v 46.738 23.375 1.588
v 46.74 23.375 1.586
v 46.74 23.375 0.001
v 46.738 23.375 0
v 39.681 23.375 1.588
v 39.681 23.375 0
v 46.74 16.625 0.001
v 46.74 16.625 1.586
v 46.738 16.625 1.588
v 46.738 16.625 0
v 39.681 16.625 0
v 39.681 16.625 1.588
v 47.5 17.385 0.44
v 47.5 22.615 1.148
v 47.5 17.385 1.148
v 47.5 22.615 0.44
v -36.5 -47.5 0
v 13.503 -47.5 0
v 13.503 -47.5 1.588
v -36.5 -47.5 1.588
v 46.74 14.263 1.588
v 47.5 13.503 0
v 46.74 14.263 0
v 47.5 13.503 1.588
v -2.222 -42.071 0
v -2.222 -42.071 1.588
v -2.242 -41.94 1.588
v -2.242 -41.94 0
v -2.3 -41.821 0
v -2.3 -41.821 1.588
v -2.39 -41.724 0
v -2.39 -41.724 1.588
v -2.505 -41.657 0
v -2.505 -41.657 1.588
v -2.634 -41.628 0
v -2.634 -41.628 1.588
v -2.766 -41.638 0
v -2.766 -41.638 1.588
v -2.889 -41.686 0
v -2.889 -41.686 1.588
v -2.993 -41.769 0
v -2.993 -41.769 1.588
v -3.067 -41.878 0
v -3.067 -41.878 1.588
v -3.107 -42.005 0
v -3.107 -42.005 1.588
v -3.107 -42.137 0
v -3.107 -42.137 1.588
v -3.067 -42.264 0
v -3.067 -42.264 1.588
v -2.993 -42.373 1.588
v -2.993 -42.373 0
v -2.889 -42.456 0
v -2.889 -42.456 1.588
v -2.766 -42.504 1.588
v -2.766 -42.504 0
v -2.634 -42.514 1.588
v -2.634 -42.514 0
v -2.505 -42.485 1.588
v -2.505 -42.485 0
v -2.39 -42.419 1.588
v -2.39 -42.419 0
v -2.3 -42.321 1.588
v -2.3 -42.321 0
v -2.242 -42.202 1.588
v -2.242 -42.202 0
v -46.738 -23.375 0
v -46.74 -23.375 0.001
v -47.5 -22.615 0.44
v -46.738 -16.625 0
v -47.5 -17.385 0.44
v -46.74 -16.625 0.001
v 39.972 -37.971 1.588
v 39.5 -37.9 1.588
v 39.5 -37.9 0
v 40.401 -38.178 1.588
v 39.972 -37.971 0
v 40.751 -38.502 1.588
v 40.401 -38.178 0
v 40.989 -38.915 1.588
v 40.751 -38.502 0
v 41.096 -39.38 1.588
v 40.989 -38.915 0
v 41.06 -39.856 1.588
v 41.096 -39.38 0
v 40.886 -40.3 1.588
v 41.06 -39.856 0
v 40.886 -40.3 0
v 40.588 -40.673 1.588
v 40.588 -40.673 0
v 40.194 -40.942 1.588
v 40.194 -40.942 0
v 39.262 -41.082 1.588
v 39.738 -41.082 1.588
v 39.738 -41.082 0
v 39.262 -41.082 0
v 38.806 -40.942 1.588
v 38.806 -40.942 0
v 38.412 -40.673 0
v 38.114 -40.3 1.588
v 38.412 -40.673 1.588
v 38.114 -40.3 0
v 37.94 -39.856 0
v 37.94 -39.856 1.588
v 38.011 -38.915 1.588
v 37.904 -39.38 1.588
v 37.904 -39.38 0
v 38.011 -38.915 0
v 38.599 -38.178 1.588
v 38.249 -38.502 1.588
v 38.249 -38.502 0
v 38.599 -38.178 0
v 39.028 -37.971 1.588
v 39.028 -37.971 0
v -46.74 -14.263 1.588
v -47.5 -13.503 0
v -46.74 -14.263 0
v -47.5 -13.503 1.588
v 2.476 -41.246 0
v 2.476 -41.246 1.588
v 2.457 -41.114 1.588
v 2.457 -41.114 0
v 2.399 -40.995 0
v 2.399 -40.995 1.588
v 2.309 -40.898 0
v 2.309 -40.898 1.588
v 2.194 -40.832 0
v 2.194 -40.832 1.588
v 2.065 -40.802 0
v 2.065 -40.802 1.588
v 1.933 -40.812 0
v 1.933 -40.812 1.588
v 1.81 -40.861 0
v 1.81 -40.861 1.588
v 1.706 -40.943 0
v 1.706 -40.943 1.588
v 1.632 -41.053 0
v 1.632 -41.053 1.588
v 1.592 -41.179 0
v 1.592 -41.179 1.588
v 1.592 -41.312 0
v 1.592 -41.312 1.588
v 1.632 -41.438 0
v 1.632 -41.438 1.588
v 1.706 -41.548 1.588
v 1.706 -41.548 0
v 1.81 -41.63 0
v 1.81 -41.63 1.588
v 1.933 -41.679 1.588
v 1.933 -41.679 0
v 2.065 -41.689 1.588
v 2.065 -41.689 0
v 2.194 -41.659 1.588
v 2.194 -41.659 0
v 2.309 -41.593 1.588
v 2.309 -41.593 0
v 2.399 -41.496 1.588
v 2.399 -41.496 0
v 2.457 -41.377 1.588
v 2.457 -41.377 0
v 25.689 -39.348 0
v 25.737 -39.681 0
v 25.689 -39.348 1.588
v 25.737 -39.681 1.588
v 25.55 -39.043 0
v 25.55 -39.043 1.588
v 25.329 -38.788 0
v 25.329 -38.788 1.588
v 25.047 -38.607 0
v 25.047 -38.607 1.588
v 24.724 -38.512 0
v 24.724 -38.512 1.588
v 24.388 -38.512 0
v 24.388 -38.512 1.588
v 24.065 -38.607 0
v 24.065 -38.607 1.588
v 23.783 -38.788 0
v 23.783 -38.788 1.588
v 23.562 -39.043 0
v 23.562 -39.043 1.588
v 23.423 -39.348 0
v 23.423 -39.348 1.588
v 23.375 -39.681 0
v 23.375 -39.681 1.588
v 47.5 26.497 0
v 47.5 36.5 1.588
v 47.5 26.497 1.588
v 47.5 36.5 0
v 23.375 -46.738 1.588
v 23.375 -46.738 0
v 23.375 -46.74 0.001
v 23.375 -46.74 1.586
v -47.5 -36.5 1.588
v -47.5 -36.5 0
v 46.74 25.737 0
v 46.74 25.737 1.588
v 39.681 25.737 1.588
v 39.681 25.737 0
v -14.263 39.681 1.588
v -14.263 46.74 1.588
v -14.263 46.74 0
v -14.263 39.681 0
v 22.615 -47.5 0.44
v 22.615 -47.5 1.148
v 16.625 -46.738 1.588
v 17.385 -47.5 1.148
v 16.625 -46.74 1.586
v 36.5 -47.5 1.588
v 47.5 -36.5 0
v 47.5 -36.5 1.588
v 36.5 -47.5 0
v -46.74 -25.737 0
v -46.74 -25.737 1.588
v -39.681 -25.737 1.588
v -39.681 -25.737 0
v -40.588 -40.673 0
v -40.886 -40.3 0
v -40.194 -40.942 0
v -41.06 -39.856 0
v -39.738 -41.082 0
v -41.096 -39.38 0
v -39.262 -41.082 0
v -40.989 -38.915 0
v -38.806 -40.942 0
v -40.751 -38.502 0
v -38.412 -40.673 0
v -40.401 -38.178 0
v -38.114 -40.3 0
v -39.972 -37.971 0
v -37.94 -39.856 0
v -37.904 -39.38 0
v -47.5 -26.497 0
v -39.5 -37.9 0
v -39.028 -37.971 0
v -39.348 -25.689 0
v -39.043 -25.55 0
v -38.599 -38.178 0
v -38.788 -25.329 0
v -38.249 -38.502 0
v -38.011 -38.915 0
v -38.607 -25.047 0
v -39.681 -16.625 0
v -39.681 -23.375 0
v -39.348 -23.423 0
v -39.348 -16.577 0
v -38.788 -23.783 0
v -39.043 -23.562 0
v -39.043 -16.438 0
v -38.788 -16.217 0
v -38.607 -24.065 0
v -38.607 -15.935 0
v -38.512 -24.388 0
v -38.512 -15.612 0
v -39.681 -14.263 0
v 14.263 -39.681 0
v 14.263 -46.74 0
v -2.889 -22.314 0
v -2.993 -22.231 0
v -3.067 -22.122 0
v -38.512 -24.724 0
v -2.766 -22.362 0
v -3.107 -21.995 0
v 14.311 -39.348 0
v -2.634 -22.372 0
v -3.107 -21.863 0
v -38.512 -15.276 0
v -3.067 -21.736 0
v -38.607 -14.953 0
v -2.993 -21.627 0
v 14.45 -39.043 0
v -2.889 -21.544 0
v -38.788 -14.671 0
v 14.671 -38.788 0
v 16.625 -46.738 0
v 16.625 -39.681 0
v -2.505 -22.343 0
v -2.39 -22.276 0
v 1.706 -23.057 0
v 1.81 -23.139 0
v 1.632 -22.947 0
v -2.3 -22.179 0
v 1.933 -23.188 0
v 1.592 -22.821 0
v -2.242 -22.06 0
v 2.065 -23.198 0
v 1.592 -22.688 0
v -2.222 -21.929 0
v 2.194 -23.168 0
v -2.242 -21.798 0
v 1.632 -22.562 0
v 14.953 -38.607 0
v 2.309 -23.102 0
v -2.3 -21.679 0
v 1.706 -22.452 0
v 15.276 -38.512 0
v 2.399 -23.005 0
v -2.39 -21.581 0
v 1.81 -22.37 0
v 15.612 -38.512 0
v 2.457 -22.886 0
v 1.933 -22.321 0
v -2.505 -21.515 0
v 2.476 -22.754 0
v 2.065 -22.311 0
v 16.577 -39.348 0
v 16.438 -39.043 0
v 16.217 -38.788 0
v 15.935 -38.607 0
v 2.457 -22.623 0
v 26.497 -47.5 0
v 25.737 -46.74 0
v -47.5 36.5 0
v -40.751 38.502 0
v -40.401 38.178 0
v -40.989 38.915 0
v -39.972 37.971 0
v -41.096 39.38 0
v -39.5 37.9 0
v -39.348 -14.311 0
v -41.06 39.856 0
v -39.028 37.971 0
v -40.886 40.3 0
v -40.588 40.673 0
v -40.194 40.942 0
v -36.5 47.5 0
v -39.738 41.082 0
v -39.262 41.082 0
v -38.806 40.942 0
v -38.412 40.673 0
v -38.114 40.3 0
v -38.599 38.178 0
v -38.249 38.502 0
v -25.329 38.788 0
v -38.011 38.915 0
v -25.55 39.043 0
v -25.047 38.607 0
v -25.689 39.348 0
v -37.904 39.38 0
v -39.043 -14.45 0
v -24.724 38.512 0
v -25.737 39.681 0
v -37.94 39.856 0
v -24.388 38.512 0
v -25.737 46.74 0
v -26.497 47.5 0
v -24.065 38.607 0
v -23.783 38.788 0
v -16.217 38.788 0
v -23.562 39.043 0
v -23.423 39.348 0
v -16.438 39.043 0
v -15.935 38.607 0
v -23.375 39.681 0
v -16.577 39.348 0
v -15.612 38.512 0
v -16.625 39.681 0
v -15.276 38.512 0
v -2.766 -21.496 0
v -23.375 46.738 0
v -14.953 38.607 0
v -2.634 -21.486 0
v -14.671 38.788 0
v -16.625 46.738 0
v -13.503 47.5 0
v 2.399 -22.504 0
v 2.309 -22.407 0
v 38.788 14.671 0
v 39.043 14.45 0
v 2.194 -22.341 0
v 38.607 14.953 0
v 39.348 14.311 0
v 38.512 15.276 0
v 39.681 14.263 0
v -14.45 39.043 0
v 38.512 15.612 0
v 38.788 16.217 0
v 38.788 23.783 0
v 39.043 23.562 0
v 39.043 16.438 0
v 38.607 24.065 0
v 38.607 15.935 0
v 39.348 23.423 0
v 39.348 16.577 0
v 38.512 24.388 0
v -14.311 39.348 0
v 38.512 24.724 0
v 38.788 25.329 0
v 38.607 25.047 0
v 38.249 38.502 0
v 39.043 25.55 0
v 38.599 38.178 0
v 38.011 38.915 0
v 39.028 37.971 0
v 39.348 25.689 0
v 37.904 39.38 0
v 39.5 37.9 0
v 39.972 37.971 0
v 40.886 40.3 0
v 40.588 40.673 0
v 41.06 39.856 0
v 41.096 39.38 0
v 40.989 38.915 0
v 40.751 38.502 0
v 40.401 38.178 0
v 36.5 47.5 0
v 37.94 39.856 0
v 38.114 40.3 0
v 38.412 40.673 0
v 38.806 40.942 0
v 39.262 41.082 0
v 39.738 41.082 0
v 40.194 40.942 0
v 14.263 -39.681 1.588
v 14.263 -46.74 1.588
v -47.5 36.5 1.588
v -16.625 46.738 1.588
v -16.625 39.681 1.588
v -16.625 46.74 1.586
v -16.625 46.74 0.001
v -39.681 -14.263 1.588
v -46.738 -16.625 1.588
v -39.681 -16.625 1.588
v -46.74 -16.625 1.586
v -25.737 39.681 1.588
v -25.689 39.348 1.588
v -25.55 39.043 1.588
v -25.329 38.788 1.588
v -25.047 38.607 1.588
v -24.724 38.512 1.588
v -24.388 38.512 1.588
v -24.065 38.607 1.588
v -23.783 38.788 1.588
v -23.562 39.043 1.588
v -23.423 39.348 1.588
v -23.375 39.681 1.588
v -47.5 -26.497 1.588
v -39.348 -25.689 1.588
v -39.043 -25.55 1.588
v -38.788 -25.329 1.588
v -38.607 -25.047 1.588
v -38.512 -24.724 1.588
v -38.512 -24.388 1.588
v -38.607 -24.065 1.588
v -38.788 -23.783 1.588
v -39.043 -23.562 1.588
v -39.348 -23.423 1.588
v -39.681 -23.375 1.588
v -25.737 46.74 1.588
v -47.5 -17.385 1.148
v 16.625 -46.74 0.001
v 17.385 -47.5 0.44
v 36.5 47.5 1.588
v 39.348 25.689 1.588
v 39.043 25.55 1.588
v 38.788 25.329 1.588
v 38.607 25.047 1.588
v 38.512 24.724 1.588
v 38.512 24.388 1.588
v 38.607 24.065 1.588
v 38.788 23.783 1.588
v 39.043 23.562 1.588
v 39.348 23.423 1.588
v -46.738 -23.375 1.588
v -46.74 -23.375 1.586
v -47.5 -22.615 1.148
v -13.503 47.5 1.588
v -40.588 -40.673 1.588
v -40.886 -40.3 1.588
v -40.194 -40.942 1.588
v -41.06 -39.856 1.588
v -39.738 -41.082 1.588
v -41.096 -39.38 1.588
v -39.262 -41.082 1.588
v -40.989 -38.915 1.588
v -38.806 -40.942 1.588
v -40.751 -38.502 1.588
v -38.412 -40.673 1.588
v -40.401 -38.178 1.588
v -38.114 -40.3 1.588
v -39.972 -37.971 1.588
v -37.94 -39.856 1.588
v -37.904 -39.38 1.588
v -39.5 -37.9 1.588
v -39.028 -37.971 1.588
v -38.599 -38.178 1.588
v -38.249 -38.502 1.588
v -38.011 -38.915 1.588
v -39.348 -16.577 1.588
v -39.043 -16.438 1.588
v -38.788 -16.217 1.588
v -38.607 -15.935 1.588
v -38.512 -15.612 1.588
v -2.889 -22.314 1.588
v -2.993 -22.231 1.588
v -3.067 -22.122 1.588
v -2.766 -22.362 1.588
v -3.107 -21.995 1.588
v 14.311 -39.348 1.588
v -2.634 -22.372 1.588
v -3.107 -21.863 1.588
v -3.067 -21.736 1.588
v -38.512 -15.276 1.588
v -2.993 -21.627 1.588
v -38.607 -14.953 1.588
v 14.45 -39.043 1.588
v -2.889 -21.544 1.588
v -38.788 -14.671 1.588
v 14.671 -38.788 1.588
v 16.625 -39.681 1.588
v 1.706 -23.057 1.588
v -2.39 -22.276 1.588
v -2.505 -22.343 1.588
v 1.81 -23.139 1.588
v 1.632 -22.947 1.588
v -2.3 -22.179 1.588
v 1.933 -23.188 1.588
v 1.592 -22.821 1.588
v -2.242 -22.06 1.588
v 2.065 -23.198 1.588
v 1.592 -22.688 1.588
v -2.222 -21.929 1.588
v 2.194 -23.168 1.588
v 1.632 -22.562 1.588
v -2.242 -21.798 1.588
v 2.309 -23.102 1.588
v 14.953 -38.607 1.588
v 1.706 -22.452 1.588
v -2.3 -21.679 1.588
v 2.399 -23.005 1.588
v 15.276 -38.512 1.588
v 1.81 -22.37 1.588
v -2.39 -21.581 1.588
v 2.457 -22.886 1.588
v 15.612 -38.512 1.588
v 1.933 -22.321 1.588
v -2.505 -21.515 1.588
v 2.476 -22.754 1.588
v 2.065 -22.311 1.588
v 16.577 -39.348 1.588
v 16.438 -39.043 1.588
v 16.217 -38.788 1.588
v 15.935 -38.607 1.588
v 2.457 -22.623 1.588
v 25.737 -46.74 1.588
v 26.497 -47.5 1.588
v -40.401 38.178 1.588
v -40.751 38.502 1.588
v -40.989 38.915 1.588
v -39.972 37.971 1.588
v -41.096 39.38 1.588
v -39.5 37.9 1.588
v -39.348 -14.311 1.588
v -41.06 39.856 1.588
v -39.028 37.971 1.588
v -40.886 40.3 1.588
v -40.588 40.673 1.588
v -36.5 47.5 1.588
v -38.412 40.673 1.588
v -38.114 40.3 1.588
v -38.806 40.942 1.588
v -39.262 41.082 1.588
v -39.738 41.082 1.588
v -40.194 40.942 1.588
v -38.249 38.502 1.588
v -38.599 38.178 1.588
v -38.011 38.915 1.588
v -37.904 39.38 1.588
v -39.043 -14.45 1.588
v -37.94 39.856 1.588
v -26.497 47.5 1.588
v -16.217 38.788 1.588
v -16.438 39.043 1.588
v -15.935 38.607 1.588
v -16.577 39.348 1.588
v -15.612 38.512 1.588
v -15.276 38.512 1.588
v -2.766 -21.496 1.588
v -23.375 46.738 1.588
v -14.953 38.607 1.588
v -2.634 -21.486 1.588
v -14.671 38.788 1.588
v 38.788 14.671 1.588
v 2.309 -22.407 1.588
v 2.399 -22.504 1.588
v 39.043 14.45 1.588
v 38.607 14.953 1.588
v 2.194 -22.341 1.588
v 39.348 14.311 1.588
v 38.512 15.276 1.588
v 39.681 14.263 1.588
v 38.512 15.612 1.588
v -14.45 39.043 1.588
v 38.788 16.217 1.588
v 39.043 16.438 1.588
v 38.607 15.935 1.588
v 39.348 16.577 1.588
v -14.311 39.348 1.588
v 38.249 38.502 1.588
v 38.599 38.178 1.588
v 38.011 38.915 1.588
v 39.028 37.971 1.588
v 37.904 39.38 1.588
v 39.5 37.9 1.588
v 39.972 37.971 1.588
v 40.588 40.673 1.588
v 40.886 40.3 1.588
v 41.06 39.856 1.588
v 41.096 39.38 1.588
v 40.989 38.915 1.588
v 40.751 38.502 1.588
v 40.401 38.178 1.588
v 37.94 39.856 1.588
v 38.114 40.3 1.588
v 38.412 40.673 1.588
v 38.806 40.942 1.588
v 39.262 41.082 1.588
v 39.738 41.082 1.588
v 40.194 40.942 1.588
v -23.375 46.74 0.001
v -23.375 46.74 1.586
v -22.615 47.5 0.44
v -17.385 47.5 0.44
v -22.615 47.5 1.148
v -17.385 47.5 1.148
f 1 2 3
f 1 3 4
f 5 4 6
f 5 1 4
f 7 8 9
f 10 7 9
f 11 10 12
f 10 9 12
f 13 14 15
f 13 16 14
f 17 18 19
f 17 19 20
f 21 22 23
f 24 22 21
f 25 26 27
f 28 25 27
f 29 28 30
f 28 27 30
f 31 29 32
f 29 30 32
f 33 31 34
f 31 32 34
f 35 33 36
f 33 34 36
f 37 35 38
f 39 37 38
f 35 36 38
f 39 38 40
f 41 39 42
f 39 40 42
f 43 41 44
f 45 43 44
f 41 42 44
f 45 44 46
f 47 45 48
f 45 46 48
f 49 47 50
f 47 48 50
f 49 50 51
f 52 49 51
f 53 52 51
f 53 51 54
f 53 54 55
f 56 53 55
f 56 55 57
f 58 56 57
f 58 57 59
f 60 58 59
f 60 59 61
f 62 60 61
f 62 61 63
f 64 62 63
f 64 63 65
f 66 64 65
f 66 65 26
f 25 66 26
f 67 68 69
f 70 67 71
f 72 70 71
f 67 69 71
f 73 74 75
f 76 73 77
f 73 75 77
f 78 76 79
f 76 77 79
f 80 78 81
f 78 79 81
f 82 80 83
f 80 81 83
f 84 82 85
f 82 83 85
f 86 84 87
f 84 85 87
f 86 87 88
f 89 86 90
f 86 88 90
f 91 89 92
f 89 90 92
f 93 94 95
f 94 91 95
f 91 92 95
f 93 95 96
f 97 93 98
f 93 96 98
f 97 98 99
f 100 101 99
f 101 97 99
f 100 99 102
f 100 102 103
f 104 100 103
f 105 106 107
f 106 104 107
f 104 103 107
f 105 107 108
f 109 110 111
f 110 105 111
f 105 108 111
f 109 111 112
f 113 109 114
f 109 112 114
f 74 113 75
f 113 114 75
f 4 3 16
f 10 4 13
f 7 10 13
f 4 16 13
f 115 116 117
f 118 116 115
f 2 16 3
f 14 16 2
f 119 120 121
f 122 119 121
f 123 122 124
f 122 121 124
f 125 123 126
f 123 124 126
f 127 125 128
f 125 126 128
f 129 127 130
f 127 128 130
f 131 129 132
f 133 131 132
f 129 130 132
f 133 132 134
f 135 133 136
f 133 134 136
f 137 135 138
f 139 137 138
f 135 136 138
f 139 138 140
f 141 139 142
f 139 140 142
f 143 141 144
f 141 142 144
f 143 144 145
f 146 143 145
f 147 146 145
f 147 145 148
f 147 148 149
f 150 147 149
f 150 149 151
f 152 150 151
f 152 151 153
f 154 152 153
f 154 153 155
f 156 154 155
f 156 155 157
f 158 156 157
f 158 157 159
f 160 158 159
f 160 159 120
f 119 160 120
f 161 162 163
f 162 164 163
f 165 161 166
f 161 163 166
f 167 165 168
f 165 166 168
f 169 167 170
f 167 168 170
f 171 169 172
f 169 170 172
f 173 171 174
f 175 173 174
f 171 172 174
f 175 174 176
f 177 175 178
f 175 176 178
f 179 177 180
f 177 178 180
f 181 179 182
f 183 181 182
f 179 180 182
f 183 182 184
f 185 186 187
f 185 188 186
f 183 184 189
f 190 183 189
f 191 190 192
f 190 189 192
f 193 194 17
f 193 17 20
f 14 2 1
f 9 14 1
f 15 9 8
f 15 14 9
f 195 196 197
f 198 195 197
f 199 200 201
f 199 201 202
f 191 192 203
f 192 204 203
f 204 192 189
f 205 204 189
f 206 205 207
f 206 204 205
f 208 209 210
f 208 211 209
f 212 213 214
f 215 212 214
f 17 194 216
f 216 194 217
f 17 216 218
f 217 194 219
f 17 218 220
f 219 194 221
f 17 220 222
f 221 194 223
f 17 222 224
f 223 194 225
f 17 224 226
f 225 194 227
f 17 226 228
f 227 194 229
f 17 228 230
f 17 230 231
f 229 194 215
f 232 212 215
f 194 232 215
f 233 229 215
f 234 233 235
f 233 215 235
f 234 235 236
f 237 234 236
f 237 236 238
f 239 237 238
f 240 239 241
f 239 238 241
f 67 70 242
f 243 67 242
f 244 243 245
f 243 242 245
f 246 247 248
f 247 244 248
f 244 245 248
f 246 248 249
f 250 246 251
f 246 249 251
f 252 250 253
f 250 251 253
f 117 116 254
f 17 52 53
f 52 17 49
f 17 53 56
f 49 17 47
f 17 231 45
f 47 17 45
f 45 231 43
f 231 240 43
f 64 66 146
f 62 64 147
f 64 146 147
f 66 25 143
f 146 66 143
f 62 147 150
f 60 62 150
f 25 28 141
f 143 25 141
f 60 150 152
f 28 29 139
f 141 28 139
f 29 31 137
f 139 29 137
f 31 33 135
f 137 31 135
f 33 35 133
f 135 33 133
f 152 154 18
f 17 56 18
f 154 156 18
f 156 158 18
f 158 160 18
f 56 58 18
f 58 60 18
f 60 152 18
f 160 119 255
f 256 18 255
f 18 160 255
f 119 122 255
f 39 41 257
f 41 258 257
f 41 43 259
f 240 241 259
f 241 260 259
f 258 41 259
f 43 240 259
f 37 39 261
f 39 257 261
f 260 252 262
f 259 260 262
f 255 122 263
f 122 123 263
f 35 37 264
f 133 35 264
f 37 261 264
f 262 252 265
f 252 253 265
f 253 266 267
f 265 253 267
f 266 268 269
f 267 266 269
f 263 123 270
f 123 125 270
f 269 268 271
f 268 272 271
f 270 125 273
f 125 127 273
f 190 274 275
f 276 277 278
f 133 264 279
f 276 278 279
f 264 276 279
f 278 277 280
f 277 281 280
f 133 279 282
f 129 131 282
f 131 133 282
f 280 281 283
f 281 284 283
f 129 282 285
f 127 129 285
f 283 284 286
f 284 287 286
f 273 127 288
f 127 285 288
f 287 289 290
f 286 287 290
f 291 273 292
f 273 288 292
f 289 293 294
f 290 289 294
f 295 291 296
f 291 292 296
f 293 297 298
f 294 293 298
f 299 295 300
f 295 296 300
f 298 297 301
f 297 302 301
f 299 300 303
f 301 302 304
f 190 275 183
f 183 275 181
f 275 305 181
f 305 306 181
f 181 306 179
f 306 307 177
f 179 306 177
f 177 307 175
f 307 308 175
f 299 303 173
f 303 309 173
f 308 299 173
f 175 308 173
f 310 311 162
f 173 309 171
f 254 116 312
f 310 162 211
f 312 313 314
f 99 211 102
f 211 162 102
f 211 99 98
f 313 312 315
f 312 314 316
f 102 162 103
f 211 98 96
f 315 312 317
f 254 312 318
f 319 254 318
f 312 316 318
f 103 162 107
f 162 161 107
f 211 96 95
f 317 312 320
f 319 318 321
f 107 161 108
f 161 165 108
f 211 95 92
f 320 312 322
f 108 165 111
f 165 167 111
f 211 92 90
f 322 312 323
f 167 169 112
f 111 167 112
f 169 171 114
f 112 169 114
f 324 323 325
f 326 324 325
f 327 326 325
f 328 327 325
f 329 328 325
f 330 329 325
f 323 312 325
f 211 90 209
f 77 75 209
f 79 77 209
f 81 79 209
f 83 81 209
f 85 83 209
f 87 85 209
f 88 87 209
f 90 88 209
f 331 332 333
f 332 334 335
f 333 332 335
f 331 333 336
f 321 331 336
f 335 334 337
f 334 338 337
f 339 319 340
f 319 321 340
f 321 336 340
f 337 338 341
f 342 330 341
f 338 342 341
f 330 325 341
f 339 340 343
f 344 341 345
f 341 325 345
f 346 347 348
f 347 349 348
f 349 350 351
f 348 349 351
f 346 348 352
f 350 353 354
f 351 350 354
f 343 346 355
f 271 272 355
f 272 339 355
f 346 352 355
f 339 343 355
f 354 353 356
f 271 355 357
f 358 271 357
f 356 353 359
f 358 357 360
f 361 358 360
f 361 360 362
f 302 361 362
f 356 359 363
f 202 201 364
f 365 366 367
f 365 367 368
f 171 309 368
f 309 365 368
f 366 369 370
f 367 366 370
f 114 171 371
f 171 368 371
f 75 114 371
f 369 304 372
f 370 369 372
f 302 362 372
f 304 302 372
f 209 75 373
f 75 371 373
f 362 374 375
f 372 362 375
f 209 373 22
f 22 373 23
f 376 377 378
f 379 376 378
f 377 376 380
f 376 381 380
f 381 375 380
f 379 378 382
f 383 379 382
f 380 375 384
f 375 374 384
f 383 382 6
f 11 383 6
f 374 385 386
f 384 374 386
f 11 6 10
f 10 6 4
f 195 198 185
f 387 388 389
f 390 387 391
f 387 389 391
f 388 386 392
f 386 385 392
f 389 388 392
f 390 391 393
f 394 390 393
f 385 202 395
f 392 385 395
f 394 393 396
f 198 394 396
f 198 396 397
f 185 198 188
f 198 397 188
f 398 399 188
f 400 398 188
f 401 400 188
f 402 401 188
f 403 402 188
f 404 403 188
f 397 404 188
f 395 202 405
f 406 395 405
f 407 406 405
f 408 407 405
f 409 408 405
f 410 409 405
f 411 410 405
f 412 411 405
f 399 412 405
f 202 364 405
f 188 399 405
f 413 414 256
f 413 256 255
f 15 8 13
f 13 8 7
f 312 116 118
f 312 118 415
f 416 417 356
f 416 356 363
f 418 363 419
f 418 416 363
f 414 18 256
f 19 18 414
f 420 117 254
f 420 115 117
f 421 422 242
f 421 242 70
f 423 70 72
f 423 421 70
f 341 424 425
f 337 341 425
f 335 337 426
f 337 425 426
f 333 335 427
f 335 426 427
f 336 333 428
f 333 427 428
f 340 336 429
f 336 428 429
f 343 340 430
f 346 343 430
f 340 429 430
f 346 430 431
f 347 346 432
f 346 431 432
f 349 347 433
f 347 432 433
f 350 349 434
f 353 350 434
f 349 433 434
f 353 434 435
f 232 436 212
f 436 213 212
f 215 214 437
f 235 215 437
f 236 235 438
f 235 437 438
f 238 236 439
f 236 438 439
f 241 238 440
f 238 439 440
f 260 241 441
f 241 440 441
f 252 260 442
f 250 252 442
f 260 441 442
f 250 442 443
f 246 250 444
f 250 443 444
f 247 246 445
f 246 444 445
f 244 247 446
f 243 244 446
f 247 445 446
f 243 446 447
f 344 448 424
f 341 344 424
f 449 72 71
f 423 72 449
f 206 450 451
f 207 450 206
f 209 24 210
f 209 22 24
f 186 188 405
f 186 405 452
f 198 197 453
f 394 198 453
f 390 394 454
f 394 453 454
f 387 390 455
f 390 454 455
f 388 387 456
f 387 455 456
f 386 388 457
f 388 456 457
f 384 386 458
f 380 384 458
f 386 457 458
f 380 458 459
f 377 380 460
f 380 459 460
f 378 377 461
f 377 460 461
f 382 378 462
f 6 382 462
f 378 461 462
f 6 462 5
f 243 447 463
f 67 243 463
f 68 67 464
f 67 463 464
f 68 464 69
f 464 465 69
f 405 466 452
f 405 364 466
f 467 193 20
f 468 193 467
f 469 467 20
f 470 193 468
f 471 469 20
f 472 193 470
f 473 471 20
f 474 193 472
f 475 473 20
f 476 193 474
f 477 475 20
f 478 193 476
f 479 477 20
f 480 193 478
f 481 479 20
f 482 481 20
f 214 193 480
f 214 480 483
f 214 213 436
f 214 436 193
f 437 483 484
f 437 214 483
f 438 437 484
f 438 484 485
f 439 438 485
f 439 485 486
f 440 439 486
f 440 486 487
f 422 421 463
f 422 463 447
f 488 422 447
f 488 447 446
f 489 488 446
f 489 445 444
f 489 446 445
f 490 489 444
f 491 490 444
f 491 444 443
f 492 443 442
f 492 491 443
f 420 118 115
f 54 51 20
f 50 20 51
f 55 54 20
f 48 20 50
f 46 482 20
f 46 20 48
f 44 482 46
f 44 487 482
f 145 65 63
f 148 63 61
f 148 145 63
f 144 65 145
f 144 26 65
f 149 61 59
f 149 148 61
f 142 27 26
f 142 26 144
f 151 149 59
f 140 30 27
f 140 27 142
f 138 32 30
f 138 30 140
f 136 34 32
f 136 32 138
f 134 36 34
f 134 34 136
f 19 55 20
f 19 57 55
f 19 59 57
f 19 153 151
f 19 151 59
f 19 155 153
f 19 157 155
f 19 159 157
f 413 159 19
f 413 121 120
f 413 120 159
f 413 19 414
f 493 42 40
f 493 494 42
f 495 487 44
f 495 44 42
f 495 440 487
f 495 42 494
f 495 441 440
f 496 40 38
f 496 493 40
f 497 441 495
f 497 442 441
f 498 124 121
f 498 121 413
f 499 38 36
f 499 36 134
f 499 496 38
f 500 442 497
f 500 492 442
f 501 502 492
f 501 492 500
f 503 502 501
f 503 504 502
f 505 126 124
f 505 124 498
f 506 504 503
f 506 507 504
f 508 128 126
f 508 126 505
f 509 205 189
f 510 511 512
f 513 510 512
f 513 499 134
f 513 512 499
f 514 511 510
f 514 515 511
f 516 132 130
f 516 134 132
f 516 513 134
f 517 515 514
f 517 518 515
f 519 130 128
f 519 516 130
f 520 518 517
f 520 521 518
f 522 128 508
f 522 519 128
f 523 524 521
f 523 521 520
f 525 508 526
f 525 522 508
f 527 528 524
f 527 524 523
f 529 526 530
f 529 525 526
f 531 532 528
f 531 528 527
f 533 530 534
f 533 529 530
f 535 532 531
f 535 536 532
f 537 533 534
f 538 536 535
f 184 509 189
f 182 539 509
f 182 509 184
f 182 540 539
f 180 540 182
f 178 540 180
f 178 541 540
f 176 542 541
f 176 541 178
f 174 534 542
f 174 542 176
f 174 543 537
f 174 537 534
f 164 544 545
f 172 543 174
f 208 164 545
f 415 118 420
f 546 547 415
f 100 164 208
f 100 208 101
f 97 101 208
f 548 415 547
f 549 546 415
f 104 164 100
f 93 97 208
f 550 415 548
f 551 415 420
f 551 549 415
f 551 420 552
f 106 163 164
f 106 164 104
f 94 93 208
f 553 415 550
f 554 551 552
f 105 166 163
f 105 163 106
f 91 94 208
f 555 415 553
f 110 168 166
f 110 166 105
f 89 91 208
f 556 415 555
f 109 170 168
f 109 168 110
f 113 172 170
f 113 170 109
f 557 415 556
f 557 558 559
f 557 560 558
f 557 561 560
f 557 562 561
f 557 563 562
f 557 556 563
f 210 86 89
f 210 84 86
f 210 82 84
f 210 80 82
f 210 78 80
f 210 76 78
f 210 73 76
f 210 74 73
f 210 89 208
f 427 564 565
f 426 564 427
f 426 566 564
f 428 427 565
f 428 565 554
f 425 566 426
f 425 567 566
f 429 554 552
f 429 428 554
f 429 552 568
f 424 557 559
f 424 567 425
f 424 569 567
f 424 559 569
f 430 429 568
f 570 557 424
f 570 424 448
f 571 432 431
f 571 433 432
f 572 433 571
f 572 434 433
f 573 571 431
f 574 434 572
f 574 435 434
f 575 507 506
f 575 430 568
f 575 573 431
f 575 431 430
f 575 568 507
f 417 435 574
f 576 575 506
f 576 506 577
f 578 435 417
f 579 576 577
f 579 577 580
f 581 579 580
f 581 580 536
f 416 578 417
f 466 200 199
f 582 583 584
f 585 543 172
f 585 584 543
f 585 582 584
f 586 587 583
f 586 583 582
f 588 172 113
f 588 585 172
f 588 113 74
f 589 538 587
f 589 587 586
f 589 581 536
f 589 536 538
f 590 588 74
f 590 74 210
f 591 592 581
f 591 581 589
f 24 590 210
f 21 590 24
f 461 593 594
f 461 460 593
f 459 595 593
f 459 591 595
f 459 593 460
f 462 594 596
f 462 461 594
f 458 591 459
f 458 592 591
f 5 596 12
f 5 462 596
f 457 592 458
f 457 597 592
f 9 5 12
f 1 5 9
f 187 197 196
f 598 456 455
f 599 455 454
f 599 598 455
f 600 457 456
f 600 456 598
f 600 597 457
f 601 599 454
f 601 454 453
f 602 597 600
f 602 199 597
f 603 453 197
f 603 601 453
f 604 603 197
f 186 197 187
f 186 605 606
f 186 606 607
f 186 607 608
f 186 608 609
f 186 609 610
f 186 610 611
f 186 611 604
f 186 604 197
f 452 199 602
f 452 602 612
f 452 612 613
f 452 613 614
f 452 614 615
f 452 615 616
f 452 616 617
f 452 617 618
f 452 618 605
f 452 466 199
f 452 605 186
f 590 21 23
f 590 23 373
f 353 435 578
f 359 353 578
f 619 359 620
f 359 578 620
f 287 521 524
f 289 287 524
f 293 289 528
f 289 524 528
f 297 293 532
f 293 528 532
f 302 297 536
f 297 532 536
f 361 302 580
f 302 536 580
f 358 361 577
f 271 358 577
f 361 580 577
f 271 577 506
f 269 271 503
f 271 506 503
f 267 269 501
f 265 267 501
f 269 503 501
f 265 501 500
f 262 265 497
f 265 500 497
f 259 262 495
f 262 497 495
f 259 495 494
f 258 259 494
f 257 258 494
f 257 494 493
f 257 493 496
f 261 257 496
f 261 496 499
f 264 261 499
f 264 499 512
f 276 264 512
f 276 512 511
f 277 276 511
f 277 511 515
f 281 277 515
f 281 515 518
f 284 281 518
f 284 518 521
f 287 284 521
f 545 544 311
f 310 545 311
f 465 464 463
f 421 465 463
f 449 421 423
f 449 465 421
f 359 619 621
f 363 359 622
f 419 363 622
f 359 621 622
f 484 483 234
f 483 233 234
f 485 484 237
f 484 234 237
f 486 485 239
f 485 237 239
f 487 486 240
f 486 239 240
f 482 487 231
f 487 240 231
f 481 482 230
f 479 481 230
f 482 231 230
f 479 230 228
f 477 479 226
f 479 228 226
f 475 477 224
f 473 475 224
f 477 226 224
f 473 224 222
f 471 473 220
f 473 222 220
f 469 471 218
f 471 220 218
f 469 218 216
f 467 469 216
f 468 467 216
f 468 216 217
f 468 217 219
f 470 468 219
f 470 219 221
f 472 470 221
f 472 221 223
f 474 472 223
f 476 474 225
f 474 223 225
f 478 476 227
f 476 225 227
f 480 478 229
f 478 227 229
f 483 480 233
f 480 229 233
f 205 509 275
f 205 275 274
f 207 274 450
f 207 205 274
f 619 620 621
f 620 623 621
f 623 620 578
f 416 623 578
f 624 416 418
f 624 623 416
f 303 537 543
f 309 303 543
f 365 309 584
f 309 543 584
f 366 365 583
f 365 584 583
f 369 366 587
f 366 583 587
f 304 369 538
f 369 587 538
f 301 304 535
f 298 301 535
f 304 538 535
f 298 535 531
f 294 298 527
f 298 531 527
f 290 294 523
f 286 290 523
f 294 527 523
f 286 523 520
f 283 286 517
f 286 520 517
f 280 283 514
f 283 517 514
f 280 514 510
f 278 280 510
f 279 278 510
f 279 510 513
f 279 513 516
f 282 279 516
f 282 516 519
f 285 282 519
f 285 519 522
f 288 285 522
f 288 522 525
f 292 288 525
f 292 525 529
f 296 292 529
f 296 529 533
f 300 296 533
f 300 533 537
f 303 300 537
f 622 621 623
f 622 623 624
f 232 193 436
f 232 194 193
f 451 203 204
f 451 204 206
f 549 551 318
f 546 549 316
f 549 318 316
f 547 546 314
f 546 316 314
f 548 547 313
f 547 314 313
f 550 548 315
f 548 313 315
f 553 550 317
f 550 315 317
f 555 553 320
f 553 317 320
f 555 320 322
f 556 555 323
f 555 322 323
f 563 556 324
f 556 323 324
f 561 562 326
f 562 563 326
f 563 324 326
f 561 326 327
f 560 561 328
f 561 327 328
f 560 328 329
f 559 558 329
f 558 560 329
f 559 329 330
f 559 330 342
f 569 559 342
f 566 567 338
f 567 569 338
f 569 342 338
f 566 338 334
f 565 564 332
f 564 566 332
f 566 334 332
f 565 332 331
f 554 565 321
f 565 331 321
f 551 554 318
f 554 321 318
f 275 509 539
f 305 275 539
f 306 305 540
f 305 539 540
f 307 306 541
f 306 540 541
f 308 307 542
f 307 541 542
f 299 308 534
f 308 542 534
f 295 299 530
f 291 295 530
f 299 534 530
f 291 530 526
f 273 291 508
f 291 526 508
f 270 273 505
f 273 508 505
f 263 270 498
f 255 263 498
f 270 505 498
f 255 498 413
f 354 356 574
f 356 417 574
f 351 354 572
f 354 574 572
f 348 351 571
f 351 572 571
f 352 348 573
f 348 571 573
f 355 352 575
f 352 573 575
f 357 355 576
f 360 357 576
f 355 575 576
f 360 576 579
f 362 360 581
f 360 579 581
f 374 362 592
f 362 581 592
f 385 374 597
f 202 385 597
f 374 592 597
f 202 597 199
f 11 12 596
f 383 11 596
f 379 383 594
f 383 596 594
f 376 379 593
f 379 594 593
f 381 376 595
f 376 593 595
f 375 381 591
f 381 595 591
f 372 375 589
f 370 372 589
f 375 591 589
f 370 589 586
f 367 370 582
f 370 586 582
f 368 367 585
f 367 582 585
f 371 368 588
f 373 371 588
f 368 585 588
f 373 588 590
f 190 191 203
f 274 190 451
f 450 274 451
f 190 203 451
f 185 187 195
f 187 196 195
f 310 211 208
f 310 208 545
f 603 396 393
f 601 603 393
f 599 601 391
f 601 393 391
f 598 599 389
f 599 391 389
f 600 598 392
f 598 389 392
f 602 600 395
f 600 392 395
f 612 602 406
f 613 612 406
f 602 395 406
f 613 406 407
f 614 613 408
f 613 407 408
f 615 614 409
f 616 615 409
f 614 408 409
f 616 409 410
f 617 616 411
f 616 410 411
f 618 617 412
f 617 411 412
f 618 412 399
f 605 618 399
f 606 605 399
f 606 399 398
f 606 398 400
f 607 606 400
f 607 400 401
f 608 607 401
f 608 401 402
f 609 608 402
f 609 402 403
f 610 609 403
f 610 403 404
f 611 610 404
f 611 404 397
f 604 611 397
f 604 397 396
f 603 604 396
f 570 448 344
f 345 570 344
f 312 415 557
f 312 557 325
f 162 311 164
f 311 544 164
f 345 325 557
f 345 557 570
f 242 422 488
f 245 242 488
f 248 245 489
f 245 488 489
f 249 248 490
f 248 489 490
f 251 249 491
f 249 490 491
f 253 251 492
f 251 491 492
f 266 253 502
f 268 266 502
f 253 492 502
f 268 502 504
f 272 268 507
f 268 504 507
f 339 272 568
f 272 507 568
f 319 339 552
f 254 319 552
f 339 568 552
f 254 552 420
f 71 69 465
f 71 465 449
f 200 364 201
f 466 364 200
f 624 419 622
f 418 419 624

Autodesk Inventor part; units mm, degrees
sketch "AL_spacer_contact_Zminus" plane through (0, 0, 0) normal (0, 0, 1) x (1, 0, 0)
  circle A0 centre (39.5, 39.5) radius 3.175
  circle A1 centre (39.5, -39.5) radius 3.175
  circle A2 centre (-39.5, -39.5) radius 3.175
  circle A3 centre (-39.5, 39.5) radius 3.175
  point P0 (0, 0)
  dimension "d228" = 39.5
  dimension "d229" = 39.5
  dimension "d230" = 39.5
  dimension "d231" = 39.5
  dimension "d232" = 39.5
  dimension "d233" = 39.5
  dimension "d234" = 39.5
  dimension "d235" = 39.5
  dimension "d236" = 6.35
sketch "Delrin_stayout_Zminus" plane through (0, 0, 0) normal (0, 0, 1) x (1, 0, 0)
  line L0 (47.5, 39.5) -> (47.5, 31)
  line L1 (47.5, 31) -> (39.5, 31)
  line L2 (39.5, 31) -> (31, 39.5)
  line L3 (31, 39.5) -> (31, 47.5)
  line L4 (31, 47.5) -> (39.5, 47.5)
  line L5 (39.5, 47.5) -> (47.5, 39.5)
  line L6 (-39.5, 47.5) -> (-47.5, 39.5)
  line L7 (-47.5, 39.5) -> (-47.5, 31)
  line L8 (-47.5, 31) -> (-39.5, 31)
  line L9 (-39.5, 31) -> (-31, 39.5)
  line L10 (-31, 39.5) -> (-31, 47.5)
  line L11 (-31, 47.5) -> (-39.5, 47.5)
  line L12 (47.5, -39.5) -> (39.5, -47.5)
  line L13 (39.5, -47.5) -> (31, -47.5)
  line L14 (31, -47.5) -> (31, -39.5)
  line L15 (31, -39.5) -> (39.5, -31)
  line L16 (39.5, -31) -> (47.5, -31)
  line L17 (47.5, -31) -> (47.5, -39.5)
  line L18 (-39.5, -47.5) -> (-47.5, -39.5)
  line L19 (-47.5, -39.5) -> (-47.5, -31)
  line L20 (-47.5, -31) -> (-39.5, -31)
  line L21 (-39.5, -31) -> (-31, -39.5)
  line L22 (-31, -39.5) -> (-31, -47.5)
  line L23 (-31, -47.5) -> (-39.5, -47.5)
  point P0 (0, 0)
  dimension "d243" = 16.5
  dimension "d244" = 8
  dimension "d245" = 8.5
  dimension "d246" = 16.5
  dimension "d247" = 47.5
  dimension "d248" = 47.5
  dimension "d249" = 47.5
  dimension "d250" = 47.5
  dimension "d251" = 47.5
  dimension "d252" = 47.5
  dimension "d253" = 47.5
  dimension "d254" = 47.5
sketch "Nub_stayout_Zminus" plane through (0, 0, 0) normal (0, 0, 1) x (1, 0, 0)
  line L0 (29, 47.5) -> (39.5, 47.5)
  line L1 (39.5, 47.5) -> (47.5, 39.5)
  line L2 (47.5, 39.5) -> (47.5, 29)
  line L3 (47.5, 29) -> (42, 29)
  line L4 (42, 29) -> (42, 40.4125)
  line L5 (40.4125, 42) -> (29, 42)
  line L6 (29, 42) -> (29, 47.5)
  arc A0 (42, 40.4125) -> (40.4125, 42) centre (40.4125, 40.4125) ccw
  line L7 (-29, 47.5) -> (-39.5, 47.5)
  line L8 (-39.5, 47.5) -> (-47.5, 39.5)
  line L9 (-47.5, 39.5) -> (-47.5, 29)
  line L10 (-47.5, 29) -> (-42, 29)
  line L11 (-42, 29) -> (-42, 40.4125)
  line L12 (-40.4125, 42) -> (-29, 42)
  line L13 (-29, 42) -> (-29, 47.5)
  arc A1 (-40.4125, 42) -> (-42, 40.4125) centre (-40.4125, 40.4125) ccw
  line L14 (-47.5, -29) -> (-42, -29)
  line L15 (-42, -29) -> (-42, -40.4125)
  line L16 (-40.4125, -42) -> (-29, -42)
  line L17 (-29, -42) -> (-29, -47.5)
  line L18 (-29, -47.5) -> (-39.5, -47.5)
  line L19 (-39.5, -47.5) -> (-47.5, -39.5)
  line L20 (-47.5, -39.5) -> (-47.5, -29)
  arc A2 (-42, -40.4125) -> (-40.4125, -42) centre (-40.4125, -40.4125) ccw
  line L21 (47.5, -29) -> (42, -29)
  line L22 (42, -29) -> (42, -40.4125)
  line L23 (40.4125, -42) -> (29, -42)
  line L24 (29, -42) -> (29, -47.5)
  line L25 (29, -47.5) -> (39.5, -47.5)
  line L26 (39.5, -47.5) -> (47.5, -39.5)
  line L27 (47.5, -39.5) -> (47.5, -29)
  arc A3 (40.4125, -42) -> (42, -40.4125) centre (40.4125, -40.4125) ccw
  point P0 (0, 0)
  dimension "d255" = 1.5875
  dimension "d256" = 18.5
  dimension "d257" = 8
  dimension "d258" = 5.5
  dimension "d259" = 47.5
  dimension "d260" = 47.5
  dimension "d264" = 1.5875
  dimension "d265" = 47.5
  dimension "d266" = 47.5
  dimension "d267" = 1.5875
  dimension "d268" = 47.5
  dimension "d269" = 47.5
  dimension "d270" = 1.5875
  dimension "d271" = 47.5
  dimension "d272" = 47.5
ref_plane "Zplus_face" through (0, 0, 1.5875) normal (0, 0, 1) x (1, 0, 0)
sketch "AL_spacer_contact_Zplus" plane through (0, 0, 1.5875) normal (0, 0, 1) x (1, 0, 0)
  circle A0 centre (-39.5, 39.5) radius 3.175
  circle A1 centre (-39.5, -39.5) radius 3.175
  circle A2 centre (39.5, -39.5) radius 3.175
  circle A3 centre (39.5, 39.5) radius 3.175
  point P0 (0, 0)
  dimension "d129" = 39.5
  dimension "d130" = 39.5
  dimension "d131" = 39.5
  dimension "d132" = 39.5
  dimension "d133" = 6.35
sketch "Delrin_stayout_Zplus" plane through (0, 0, 1.5875) normal (0, 0, 1) x (1, 0, 0)
  line L0 (47.5, -31) -> (47.5, -39.5)
  line L1 (47.5, -39.5) -> (39.5, -47.5)
  line L2 (39.5, -47.5) -> (31, -47.5)
  line L3 (31, -47.5) -> (31, -39.5)
  line L4 (31, -39.5) -> (39.5, -31)
  line L5 (39.5, -31) -> (47.5, -31)
  line L6 (47.5, 31) -> (47.5, 39.5)
  line L7 (47.5, 39.5) -> (39.5, 47.5)
  line L8 (39.5, 47.5) -> (31, 47.5)
  line L9 (31, 47.5) -> (31, 39.5)
  line L10 (31, 39.5) -> (39.5, 31)
  line L11 (39.5, 31) -> (47.5, 31)
  line L12 (-39.5, 47.5) -> (-47.5, 39.5)
  line L13 (-47.5, 39.5) -> (-47.5, 31)
  line L14 (-47.5, 31) -> (-39.5, 31)
  line L15 (-39.5, 31) -> (-31, 39.5)
  line L16 (-31, 39.5) -> (-31, 47.5)
  line L17 (-31, 47.5) -> (-39.5, 47.5)
  line L18 (-47.5, -39.5) -> (-39.5, -47.5)
  line L19 (-39.5, -47.5) -> (-31, -47.5)
  line L20 (-31, -47.5) -> (-31, -39.5)
  line L21 (-31, -39.5) -> (-39.5, -31)
  line L22 (-39.5, -31) -> (-47.5, -31)
  line L23 (-47.5, -31) -> (-47.5, -39.5)
  point P0 (0, 0)
  dimension "d115" = 16.5
  dimension "d116" = 16.5
  dimension "d117" = 8
  dimension "d118" = 8.5
  dimension "d121" = 47.5
  dimension "d122" = 47.5
  dimension "d123" = 47.5
  dimension "d124" = 47.5
  dimension "d125" = 47.5
  dimension "d126" = 47.5
  dimension "d127" = 47.5
  dimension "d128" = 47.5
sketch "Nub_stayout_Zplus" plane through (0, 0, 1.5875) normal (0, 0, 1) x (1, 0, 0)
  line L0 (47.5, 29) -> (42, 29)
  line L1 (42, 29) -> (42, 40.4125)
  line L2 (40.4125, 42) -> (29, 42)
  line L3 (29, 42) -> (29, 47.5)
  arc A0 (42, 40.4125) -> (40.4125, 42) centre (40.4125, 40.4125) ccw
  line L4 (29, 47.5) -> (39.5, 47.5)
  line L5 (39.5, 47.5) -> (47.5, 39.5)
  line L6 (47.5, 39.5) -> (47.5, 29)
  line L7 (-39.5, 47.5) -> (-29, 47.5)
  line L8 (-29, 47.5) -> (-29, 42)
  line L9 (-29, 42) -> (-40.4125, 42)
  line L10 (-42, 40.4125) -> (-42, 29)
  line L11 (-42, 29) -> (-47.5, 29)
  line L12 (-47.5, 29) -> (-47.5, 39.5)
  line L13 (-47.5, 39.5) -> (-39.5, 47.5)
  arc A1 (-40.4125, 42) -> (-42, 40.4125) centre (-40.4125, 40.4125) ccw
  line L14 (-47.5, -29) -> (-47.5, -39.5)
  line L15 (-47.5, -39.5) -> (-39.5, -47.5)
  line L16 (-39.5, -47.5) -> (-29, -47.5)
  line L17 (-29, -47.5) -> (-29, -42)
  line L18 (-29, -42) -> (-40.4125, -42)
  line L19 (-42, -40.4125) -> (-42, -29)
  line L20 (-42, -29) -> (-47.5, -29)
  arc A2 (-42, -40.4125) -> (-40.4125, -42) centre (-40.4125, -40.4125) ccw
  line L21 (29, -47.5) -> (39.5, -47.5)
  line L22 (39.5, -47.5) -> (47.5, -39.5)
  line L23 (47.5, -39.5) -> (47.5, -29)
  line L24 (47.5, -29) -> (42, -29)
  line L25 (42, -29) -> (42, -40.4125)
  line L26 (40.4125, -42) -> (29, -42)
  line L27 (29, -42) -> (29, -47.5)
  arc A3 (40.4125, -42) -> (42, -40.4125) centre (40.4125, -40.4125) ccw
  point P0 (0, 0)
  dimension "d146" = 1.5875
  dimension "d147" = 5.5
  dimension "d149" = 18.5
  dimension "d150" = 8
  dimension "d151" = 47.5
  dimension "d152" = 47.5
  dimension "d153" = 1.5875
  dimension "d154" = 47.5
  dimension "d155" = 47.5
  dimension "d156" = 1.5875
  dimension "d157" = 47.5
  dimension "d158" = 47.5
  dimension "d159" = 1.5875
  dimension "d160" = 47.5
  dimension "d161" = 47.5
sketch "Sketch1" plane through (0, 0, 0) normal (0, 0, 1) x (1, 0, 0)
  line L0 (-47.5, 47.5) -> (47.5, 47.5)
  line L1 (47.5, 47.5) -> (47.5, -47.5)
  line L2 (47.5, -47.5) -> (-47.5, -47.5)
  line L3 (-47.5, -47.5) -> (-47.5, 47.5)
  point P0 (0, 0)
  dimension "d0" = 95
  dimension "d1" = 95
  dimension "d2" = 47.5
  dimension "d3" = 47.5
extrude "Extrusion1" add sketch "Sketch1" along normal blind 1.5875
chamfer "Chamfer2" distance 11 angle 45 4 edges at (-47.5, -47.5, 0.7937) (47.5, -47.5, 0.7937) (47.5, 47.5, 0.7937) (-47.5, 47.5, 0.7937)
ref_plane "Work Plane_ConnX" through (-32, 0, 0) normal (1, 0, 0) x (0, 1, 0)
ref_plane "Work Plane_ConnY" through (0, 0, 0) normal (0, 1, 0) x (-1, 0, 0)
sketch "Sketch9" plane through (0, 0, 1.5875) normal (0, 0, 1) x (1, 0, 0)
  line L0 (47.5, 47.5) -> (47.5, -47.5) projected
  line L1 (58.5598, -32) -> (-58.5598, -32)
  circle A0 centre (-2.667, -21.9289) radius 0.4445
  circle A1 centre (-2.667, -42.0711) radius 0.4445
  line L2 (0, 26.5598) -> (0, -90.5598) construction
  point P0 (0, 0)
  point P1 (0, -32)
  dimension "d134" = 20.1422
  dimension "d136" = 2.667
  dimension "d138" = 0.889
  dimension "d141" = 180
  dimension "d350" = 32
  dimension "d351" = 0
extrude "Holes_Conn_Zminus" cut sketch "Sketch9" against normal through all
sketch "Sketch22" plane through (0, 0, 1.5875) normal (0, 0, 1) x (1, 0, 0)
  line L0 (47.5, 36.5) -> (47.5, -36.5) projected
  line L1 (0, -1.0026) -> (0, -62.9974) construction
  line L2 (62.8115, -32) -> (-62.8115, -32)
  circle A0 centre (2.032, -22.7545) radius 0.4445
  circle A1 centre (2.032, -41.2455) radius 0.4445
  point P0 (0, 0)
  point P1 (0, -32)
  dimension "d282" = 180
  dimension "d283" = 18.491
  dimension "d284" = 0.889
  dimension "d285" = 2.032
  dimension "d352" = 32
  dimension "d353" = 0
extrude "Holes_Conn_Zplus" cut sketch "Sketch22" against normal through all
hole "Hole5" at (39.5, 39.5, 1.5875) direction (0, 0, -1) diameter 3.2 end through all
mirror "Mirror5" about plane through (0, 0, 0) normal (1, 0, 0) of "Hole5"
mirror "Mirror6" about plane through (0, 0, 0) normal (0, 1, 0) of "Hole5", "Mirror5"
sketch "Sketch25" plane through (0, 0, 1.5875) normal (0, 0, 1) x (1, 0, 0)
  circle A0 centre (-39.5, -39.5) radius 1.6 projected
  circle A1 centre (39.5, -39.5) radius 1.6 projected
  circle A2 centre (-39.5, 39.5) radius 1.6 projected
  circle A3 centre (39.5, 39.5) radius 1.6 projected
  line L0 (36.5, -47.5) -> (-36.5, -47.5) projected
  line L1 (0, 0) -> (0, -59.2198)
  line L2 (8, -47.5) -> (8, -15.5)
  line L3 (8, -15.5) -> (-8, -15.5)
  line L4 (-8, -15.5) -> (-8, -47.5)
  line L5 (-8, -47.5) -> (-62.7516, -61.7336)
  line L6 (-62.7516, -61.7336) -> (-64.2933, 68.2222)
  line L7 (-64.2933, 68.2222) -> (58.3572, 62.5728)
  line L8 (58.3572, 62.5728) -> (56.5848, -69.017)
  line L9 (56.5848, -69.017) -> (8, -47.5)
  dimension "d362" = 16
  dimension "d363" = 32
extrude "Extrusion9" [suppressed]
ref_plane "Work Plane4" through (0, 25, 0) normal (0, 1, 0) x (-1, 0, 0)
sketch "Sketch26" plane through (0, 0, 1.5875) normal (0, 0, 1) x (1, 0, 0)
  line L0 (47.5, 36.5) -> (47.5, -36.5) projected
  line L1 (52.6018, 20) -> (36.5, 20)
  line L2 (47.5, 23.375) -> (39.681, 23.375)
  line L3 (47.5, 23.375) -> (47.5, 25.737)
  line L4 (47.5, 25.737) -> (39.681, 25.737)
  arc A0 (39.681, 25.737) -> (39.681, 23.375) centre (39.681, 24.556) ccw
  line L5 (47.5, 16.625) -> (39.681, 16.625)
  line L6 (47.5, 16.625) -> (47.5, 14.263)
  line L7 (47.5, 14.263) -> (39.681, 14.263)
  arc A1 (39.681, 16.625) -> (39.681, 14.263) centre (39.681, 15.444) ccw
  point P0 (0, 0)
  point P1 (0, 20)
  dimension "d366" = 20
  dimension "d367" = 2.362
  dimension "d368" = 9
  dimension "d370" = 6.75
extrude "Extrusion10" cut sketch "Sketch26" against normal through all
chamfer "Chamfer4" distance 0.76 angle 45 4 edges at (47.5, 23.375, 0.7937) (47.5, 16.625, 0.7937) (47.5, 14.263, 0.7937) (47.5, 25.737, 0.7937)
chamfer "Chamfer5" distance 0.762 angle 30 1 edges at (47.5, 20, 1.5875) measured on face at (-0.7627, 10.8966, 1.5875)
chamfer "Chamfer6" distance 0.762 angle 30 1 edges at (47.5, 20, 0) measured on face at (-0.7627, 10.8966, 0)
ref_plane "Work Plane5" through (25, 0, 0) normal (1, 0, 0) x (0, 1, 0)
sketch "Sketch27" plane through (0, 0, 1.5875) normal (0, 0, 1) x (1, 0, 0)
  line L0 (36.5, -47.5) -> (-36.5, -47.5) projected
  line L1 (20, -62.2125) -> (20, -34.4523)
  line L2 (23.375, -39.681) -> (23.375, -47.5)
  line L3 (23.375, -47.5) -> (25.737, -47.5)
  line L4 (25.737, -47.5) -> (25.737, -39.681)
  arc A0 (25.737, -39.681) -> (23.375, -39.681) centre (24.556, -39.681) ccw
  line L5 (16.625, -39.681) -> (16.625, -47.5)
  line L6 (16.625, -47.5) -> (14.263, -47.5)
  line L7 (14.263, -47.5) -> (14.263, -39.681)
  arc A1 (16.625, -39.681) -> (14.263, -39.681) centre (15.444, -39.681) ccw
  point P0 (0, 0)
  point P1 (20, 0)
  dimension "d383" = 20
  dimension "d384" = 6.75
  dimension "d386" = 9
  dimension "d387" = 2.362
extrude "Extrusion11" cut sketch "Sketch27" against normal through all
chamfer "Chamfer7" distance 0.76 angle 45 4 edges at (14.263, -47.5, 0.7937) (16.625, -47.5, 0.7937) (23.375, -47.5, 0.7937) (25.737, -47.5, 0.7937)
chamfer "Chamfer8" distance 0.762 angle 30 1 edges at (20, -47.5, 1.5875) measured on face at (-0.7627, 10.8966, 1.5875)
chamfer "Chamfer9" distance 0.762 angle 30 1 edges at (20, -47.5, 0) measured on face at (-0.7627, 10.8966, 0)
ref_plane "Work Plane6" through (0, -25, 0) normal (0, 1, 0) x (-1, 0, 0)
sketch "Sketch28" plane through (0, 0, 1.5875) normal (0, 0, 1) x (1, 0, 0)
  line L0 (-47.5, -36.5) -> (-47.5, 36.5) projected
  line L1 (-54.8364, -20) -> (-37.2879, -20)
  line L2 (-39.681, -23.375) -> (-47.5, -23.375)
  line L3 (-47.5, -23.375) -> (-47.5, -25.737)
  line L4 (-47.5, -25.737) -> (-39.681, -25.737)
  arc A0 (-39.681, -25.737) -> (-39.681, -23.375) centre (-39.681, -24.556) ccw
  line L5 (-39.681, -16.625) -> (-47.5, -16.625)
  line L6 (-47.5, -16.625) -> (-47.5, -14.263)
  line L7 (-47.5, -14.263) -> (-39.681, -14.263)
  arc A1 (-39.681, -16.625) -> (-39.681, -14.263) centre (-39.681, -15.444) ccw
  point P0 (0, 0)
  point P1 (0, -20)
  dimension "d400" = 20
  dimension "d401" = 9
  dimension "d402" = 6.75
  dimension "d403" = 2.362
extrude "Extrusion12" cut sketch "Sketch28" against normal through all
chamfer "Chamfer10" distance 0.76 angle 45 4 edges at (-47.5, -14.263, 0.7937) (-47.5, -16.625, 0.7937) (-47.5, -23.375, 0.7937) (-47.5, -25.737, 0.7937)
chamfer "Chamfer11" distance 0.762 angle 30 1 edges at (-47.5, -20, 1.5875) measured on face at (-0.7627, 10.8966, 1.5875)
chamfer "Chamfer12" distance 0.762 angle 30 1 edges at (-47.5, -20, 0) measured on face at (-0.7627, 10.8966, 0)
ref_plane "Work Plane7" through (-25, 0, 0) normal (1, 0, 0) x (0, 1, 0)
sketch "Sketch29" plane through (0, 0, 1.5875) normal (0, 0, 1) x (1, 0, 0)
  line L0 (-36.5, 47.5) -> (36.5, 47.5) projected
  line L1 (-20, 52.223) -> (-20, 33.9375)
  line L2 (-23.375, 39.681) -> (-23.375, 47.5)
  line L3 (-23.375, 47.5) -> (-25.737, 47.5)
  line L4 (-25.737, 47.5) -> (-25.737, 39.681)
  arc A0 (-25.737, 39.681) -> (-23.375, 39.681) centre (-24.556, 39.681) ccw
  line L5 (-16.625, 39.681) -> (-16.625, 47.5)
  line L6 (-16.625, 47.5) -> (-14.263, 47.5)
  line L7 (-14.263, 47.5) -> (-14.263, 39.681)
  arc A1 (-16.625, 39.681) -> (-14.263, 39.681) centre (-15.444, 39.681) ccw
  point P0 (0, 0)
  point P1 (-20, 0)
  dimension "d416" = 20
  dimension "d417" = 9
  dimension "d418" = 6.75
  dimension "d419" = 2.362
extrude "Extrusion13" cut sketch "Sketch29" against normal through all
chamfer "Chamfer13" distance 0.76 angle 45 4 edges at (-14.263, 47.5, 0.7937) (-16.625, 47.5, 0.7937) (-23.375, 47.5, 0.7937) (-25.737, 47.5, 0.7937)
chamfer "Chamfer14" distance 0.762 angle 30 1 edges at (-20, 47.5, 1.5875) measured on face at (7.0407, 10.841, 1.5875)
chamfer "Chamfer15" distance 0.762 angle 30 1 edges at (-20, 47.5, 0) measured on face at (7.0407, 10.841, 0)
sketch "Sketch30" plane through (0, 0, 1.5875) normal (0, 0, 1) x (1, 0, 0)
  line L0 (-47.5, -36.5) -> (-47.5, -26.497) projected
  line L1 (13.503, -47.5) -> (-36.5, -47.5) projected
  line L2 (47.5, 36.5) -> (47.5, 26.497) projected
  line L3 (-13.503, 47.5) -> (36.5, 47.5) projected
  line L4 (-47.5, 47.5) -> (47.5, 47.5) construction
  line L5 (47.5, 47.5) -> (47.5, -47.5) construction
  line L6 (47.5, -47.5) -> (-47.5, -47.5) construction
  line L7 (-47.5, -47.5) -> (-47.5, 47.5) construction
  point P0 (0, 0)
decal "Decal1"
sketch "Sketch31" plane through (0, 0, 0) normal (0, 0, -1) x (-1, 0, 0)
  line L0 (-47.5, 13.503) -> (-47.5, -36.5) projected
  line L1 (-36.5, -47.5) -> (-26.497, -47.5) projected
  line L2 (47.5, -13.503) -> (47.5, 36.5) projected
  line L3 (36.5, 47.5) -> (26.497, 47.5) projected
  line L4 (-47.5, 47.5) -> (47.5, 47.5) construction
  line L5 (47.5, 47.5) -> (47.5, -47.5) construction
  line L6 (47.5, -47.5) -> (-47.5, -47.5) construction
  line L7 (-47.5, -47.5) -> (-47.5, 47.5) construction
  point P0 (0, 0)
decal "Decal2"
properties part number "PCB_Batt1" material "FR4"
